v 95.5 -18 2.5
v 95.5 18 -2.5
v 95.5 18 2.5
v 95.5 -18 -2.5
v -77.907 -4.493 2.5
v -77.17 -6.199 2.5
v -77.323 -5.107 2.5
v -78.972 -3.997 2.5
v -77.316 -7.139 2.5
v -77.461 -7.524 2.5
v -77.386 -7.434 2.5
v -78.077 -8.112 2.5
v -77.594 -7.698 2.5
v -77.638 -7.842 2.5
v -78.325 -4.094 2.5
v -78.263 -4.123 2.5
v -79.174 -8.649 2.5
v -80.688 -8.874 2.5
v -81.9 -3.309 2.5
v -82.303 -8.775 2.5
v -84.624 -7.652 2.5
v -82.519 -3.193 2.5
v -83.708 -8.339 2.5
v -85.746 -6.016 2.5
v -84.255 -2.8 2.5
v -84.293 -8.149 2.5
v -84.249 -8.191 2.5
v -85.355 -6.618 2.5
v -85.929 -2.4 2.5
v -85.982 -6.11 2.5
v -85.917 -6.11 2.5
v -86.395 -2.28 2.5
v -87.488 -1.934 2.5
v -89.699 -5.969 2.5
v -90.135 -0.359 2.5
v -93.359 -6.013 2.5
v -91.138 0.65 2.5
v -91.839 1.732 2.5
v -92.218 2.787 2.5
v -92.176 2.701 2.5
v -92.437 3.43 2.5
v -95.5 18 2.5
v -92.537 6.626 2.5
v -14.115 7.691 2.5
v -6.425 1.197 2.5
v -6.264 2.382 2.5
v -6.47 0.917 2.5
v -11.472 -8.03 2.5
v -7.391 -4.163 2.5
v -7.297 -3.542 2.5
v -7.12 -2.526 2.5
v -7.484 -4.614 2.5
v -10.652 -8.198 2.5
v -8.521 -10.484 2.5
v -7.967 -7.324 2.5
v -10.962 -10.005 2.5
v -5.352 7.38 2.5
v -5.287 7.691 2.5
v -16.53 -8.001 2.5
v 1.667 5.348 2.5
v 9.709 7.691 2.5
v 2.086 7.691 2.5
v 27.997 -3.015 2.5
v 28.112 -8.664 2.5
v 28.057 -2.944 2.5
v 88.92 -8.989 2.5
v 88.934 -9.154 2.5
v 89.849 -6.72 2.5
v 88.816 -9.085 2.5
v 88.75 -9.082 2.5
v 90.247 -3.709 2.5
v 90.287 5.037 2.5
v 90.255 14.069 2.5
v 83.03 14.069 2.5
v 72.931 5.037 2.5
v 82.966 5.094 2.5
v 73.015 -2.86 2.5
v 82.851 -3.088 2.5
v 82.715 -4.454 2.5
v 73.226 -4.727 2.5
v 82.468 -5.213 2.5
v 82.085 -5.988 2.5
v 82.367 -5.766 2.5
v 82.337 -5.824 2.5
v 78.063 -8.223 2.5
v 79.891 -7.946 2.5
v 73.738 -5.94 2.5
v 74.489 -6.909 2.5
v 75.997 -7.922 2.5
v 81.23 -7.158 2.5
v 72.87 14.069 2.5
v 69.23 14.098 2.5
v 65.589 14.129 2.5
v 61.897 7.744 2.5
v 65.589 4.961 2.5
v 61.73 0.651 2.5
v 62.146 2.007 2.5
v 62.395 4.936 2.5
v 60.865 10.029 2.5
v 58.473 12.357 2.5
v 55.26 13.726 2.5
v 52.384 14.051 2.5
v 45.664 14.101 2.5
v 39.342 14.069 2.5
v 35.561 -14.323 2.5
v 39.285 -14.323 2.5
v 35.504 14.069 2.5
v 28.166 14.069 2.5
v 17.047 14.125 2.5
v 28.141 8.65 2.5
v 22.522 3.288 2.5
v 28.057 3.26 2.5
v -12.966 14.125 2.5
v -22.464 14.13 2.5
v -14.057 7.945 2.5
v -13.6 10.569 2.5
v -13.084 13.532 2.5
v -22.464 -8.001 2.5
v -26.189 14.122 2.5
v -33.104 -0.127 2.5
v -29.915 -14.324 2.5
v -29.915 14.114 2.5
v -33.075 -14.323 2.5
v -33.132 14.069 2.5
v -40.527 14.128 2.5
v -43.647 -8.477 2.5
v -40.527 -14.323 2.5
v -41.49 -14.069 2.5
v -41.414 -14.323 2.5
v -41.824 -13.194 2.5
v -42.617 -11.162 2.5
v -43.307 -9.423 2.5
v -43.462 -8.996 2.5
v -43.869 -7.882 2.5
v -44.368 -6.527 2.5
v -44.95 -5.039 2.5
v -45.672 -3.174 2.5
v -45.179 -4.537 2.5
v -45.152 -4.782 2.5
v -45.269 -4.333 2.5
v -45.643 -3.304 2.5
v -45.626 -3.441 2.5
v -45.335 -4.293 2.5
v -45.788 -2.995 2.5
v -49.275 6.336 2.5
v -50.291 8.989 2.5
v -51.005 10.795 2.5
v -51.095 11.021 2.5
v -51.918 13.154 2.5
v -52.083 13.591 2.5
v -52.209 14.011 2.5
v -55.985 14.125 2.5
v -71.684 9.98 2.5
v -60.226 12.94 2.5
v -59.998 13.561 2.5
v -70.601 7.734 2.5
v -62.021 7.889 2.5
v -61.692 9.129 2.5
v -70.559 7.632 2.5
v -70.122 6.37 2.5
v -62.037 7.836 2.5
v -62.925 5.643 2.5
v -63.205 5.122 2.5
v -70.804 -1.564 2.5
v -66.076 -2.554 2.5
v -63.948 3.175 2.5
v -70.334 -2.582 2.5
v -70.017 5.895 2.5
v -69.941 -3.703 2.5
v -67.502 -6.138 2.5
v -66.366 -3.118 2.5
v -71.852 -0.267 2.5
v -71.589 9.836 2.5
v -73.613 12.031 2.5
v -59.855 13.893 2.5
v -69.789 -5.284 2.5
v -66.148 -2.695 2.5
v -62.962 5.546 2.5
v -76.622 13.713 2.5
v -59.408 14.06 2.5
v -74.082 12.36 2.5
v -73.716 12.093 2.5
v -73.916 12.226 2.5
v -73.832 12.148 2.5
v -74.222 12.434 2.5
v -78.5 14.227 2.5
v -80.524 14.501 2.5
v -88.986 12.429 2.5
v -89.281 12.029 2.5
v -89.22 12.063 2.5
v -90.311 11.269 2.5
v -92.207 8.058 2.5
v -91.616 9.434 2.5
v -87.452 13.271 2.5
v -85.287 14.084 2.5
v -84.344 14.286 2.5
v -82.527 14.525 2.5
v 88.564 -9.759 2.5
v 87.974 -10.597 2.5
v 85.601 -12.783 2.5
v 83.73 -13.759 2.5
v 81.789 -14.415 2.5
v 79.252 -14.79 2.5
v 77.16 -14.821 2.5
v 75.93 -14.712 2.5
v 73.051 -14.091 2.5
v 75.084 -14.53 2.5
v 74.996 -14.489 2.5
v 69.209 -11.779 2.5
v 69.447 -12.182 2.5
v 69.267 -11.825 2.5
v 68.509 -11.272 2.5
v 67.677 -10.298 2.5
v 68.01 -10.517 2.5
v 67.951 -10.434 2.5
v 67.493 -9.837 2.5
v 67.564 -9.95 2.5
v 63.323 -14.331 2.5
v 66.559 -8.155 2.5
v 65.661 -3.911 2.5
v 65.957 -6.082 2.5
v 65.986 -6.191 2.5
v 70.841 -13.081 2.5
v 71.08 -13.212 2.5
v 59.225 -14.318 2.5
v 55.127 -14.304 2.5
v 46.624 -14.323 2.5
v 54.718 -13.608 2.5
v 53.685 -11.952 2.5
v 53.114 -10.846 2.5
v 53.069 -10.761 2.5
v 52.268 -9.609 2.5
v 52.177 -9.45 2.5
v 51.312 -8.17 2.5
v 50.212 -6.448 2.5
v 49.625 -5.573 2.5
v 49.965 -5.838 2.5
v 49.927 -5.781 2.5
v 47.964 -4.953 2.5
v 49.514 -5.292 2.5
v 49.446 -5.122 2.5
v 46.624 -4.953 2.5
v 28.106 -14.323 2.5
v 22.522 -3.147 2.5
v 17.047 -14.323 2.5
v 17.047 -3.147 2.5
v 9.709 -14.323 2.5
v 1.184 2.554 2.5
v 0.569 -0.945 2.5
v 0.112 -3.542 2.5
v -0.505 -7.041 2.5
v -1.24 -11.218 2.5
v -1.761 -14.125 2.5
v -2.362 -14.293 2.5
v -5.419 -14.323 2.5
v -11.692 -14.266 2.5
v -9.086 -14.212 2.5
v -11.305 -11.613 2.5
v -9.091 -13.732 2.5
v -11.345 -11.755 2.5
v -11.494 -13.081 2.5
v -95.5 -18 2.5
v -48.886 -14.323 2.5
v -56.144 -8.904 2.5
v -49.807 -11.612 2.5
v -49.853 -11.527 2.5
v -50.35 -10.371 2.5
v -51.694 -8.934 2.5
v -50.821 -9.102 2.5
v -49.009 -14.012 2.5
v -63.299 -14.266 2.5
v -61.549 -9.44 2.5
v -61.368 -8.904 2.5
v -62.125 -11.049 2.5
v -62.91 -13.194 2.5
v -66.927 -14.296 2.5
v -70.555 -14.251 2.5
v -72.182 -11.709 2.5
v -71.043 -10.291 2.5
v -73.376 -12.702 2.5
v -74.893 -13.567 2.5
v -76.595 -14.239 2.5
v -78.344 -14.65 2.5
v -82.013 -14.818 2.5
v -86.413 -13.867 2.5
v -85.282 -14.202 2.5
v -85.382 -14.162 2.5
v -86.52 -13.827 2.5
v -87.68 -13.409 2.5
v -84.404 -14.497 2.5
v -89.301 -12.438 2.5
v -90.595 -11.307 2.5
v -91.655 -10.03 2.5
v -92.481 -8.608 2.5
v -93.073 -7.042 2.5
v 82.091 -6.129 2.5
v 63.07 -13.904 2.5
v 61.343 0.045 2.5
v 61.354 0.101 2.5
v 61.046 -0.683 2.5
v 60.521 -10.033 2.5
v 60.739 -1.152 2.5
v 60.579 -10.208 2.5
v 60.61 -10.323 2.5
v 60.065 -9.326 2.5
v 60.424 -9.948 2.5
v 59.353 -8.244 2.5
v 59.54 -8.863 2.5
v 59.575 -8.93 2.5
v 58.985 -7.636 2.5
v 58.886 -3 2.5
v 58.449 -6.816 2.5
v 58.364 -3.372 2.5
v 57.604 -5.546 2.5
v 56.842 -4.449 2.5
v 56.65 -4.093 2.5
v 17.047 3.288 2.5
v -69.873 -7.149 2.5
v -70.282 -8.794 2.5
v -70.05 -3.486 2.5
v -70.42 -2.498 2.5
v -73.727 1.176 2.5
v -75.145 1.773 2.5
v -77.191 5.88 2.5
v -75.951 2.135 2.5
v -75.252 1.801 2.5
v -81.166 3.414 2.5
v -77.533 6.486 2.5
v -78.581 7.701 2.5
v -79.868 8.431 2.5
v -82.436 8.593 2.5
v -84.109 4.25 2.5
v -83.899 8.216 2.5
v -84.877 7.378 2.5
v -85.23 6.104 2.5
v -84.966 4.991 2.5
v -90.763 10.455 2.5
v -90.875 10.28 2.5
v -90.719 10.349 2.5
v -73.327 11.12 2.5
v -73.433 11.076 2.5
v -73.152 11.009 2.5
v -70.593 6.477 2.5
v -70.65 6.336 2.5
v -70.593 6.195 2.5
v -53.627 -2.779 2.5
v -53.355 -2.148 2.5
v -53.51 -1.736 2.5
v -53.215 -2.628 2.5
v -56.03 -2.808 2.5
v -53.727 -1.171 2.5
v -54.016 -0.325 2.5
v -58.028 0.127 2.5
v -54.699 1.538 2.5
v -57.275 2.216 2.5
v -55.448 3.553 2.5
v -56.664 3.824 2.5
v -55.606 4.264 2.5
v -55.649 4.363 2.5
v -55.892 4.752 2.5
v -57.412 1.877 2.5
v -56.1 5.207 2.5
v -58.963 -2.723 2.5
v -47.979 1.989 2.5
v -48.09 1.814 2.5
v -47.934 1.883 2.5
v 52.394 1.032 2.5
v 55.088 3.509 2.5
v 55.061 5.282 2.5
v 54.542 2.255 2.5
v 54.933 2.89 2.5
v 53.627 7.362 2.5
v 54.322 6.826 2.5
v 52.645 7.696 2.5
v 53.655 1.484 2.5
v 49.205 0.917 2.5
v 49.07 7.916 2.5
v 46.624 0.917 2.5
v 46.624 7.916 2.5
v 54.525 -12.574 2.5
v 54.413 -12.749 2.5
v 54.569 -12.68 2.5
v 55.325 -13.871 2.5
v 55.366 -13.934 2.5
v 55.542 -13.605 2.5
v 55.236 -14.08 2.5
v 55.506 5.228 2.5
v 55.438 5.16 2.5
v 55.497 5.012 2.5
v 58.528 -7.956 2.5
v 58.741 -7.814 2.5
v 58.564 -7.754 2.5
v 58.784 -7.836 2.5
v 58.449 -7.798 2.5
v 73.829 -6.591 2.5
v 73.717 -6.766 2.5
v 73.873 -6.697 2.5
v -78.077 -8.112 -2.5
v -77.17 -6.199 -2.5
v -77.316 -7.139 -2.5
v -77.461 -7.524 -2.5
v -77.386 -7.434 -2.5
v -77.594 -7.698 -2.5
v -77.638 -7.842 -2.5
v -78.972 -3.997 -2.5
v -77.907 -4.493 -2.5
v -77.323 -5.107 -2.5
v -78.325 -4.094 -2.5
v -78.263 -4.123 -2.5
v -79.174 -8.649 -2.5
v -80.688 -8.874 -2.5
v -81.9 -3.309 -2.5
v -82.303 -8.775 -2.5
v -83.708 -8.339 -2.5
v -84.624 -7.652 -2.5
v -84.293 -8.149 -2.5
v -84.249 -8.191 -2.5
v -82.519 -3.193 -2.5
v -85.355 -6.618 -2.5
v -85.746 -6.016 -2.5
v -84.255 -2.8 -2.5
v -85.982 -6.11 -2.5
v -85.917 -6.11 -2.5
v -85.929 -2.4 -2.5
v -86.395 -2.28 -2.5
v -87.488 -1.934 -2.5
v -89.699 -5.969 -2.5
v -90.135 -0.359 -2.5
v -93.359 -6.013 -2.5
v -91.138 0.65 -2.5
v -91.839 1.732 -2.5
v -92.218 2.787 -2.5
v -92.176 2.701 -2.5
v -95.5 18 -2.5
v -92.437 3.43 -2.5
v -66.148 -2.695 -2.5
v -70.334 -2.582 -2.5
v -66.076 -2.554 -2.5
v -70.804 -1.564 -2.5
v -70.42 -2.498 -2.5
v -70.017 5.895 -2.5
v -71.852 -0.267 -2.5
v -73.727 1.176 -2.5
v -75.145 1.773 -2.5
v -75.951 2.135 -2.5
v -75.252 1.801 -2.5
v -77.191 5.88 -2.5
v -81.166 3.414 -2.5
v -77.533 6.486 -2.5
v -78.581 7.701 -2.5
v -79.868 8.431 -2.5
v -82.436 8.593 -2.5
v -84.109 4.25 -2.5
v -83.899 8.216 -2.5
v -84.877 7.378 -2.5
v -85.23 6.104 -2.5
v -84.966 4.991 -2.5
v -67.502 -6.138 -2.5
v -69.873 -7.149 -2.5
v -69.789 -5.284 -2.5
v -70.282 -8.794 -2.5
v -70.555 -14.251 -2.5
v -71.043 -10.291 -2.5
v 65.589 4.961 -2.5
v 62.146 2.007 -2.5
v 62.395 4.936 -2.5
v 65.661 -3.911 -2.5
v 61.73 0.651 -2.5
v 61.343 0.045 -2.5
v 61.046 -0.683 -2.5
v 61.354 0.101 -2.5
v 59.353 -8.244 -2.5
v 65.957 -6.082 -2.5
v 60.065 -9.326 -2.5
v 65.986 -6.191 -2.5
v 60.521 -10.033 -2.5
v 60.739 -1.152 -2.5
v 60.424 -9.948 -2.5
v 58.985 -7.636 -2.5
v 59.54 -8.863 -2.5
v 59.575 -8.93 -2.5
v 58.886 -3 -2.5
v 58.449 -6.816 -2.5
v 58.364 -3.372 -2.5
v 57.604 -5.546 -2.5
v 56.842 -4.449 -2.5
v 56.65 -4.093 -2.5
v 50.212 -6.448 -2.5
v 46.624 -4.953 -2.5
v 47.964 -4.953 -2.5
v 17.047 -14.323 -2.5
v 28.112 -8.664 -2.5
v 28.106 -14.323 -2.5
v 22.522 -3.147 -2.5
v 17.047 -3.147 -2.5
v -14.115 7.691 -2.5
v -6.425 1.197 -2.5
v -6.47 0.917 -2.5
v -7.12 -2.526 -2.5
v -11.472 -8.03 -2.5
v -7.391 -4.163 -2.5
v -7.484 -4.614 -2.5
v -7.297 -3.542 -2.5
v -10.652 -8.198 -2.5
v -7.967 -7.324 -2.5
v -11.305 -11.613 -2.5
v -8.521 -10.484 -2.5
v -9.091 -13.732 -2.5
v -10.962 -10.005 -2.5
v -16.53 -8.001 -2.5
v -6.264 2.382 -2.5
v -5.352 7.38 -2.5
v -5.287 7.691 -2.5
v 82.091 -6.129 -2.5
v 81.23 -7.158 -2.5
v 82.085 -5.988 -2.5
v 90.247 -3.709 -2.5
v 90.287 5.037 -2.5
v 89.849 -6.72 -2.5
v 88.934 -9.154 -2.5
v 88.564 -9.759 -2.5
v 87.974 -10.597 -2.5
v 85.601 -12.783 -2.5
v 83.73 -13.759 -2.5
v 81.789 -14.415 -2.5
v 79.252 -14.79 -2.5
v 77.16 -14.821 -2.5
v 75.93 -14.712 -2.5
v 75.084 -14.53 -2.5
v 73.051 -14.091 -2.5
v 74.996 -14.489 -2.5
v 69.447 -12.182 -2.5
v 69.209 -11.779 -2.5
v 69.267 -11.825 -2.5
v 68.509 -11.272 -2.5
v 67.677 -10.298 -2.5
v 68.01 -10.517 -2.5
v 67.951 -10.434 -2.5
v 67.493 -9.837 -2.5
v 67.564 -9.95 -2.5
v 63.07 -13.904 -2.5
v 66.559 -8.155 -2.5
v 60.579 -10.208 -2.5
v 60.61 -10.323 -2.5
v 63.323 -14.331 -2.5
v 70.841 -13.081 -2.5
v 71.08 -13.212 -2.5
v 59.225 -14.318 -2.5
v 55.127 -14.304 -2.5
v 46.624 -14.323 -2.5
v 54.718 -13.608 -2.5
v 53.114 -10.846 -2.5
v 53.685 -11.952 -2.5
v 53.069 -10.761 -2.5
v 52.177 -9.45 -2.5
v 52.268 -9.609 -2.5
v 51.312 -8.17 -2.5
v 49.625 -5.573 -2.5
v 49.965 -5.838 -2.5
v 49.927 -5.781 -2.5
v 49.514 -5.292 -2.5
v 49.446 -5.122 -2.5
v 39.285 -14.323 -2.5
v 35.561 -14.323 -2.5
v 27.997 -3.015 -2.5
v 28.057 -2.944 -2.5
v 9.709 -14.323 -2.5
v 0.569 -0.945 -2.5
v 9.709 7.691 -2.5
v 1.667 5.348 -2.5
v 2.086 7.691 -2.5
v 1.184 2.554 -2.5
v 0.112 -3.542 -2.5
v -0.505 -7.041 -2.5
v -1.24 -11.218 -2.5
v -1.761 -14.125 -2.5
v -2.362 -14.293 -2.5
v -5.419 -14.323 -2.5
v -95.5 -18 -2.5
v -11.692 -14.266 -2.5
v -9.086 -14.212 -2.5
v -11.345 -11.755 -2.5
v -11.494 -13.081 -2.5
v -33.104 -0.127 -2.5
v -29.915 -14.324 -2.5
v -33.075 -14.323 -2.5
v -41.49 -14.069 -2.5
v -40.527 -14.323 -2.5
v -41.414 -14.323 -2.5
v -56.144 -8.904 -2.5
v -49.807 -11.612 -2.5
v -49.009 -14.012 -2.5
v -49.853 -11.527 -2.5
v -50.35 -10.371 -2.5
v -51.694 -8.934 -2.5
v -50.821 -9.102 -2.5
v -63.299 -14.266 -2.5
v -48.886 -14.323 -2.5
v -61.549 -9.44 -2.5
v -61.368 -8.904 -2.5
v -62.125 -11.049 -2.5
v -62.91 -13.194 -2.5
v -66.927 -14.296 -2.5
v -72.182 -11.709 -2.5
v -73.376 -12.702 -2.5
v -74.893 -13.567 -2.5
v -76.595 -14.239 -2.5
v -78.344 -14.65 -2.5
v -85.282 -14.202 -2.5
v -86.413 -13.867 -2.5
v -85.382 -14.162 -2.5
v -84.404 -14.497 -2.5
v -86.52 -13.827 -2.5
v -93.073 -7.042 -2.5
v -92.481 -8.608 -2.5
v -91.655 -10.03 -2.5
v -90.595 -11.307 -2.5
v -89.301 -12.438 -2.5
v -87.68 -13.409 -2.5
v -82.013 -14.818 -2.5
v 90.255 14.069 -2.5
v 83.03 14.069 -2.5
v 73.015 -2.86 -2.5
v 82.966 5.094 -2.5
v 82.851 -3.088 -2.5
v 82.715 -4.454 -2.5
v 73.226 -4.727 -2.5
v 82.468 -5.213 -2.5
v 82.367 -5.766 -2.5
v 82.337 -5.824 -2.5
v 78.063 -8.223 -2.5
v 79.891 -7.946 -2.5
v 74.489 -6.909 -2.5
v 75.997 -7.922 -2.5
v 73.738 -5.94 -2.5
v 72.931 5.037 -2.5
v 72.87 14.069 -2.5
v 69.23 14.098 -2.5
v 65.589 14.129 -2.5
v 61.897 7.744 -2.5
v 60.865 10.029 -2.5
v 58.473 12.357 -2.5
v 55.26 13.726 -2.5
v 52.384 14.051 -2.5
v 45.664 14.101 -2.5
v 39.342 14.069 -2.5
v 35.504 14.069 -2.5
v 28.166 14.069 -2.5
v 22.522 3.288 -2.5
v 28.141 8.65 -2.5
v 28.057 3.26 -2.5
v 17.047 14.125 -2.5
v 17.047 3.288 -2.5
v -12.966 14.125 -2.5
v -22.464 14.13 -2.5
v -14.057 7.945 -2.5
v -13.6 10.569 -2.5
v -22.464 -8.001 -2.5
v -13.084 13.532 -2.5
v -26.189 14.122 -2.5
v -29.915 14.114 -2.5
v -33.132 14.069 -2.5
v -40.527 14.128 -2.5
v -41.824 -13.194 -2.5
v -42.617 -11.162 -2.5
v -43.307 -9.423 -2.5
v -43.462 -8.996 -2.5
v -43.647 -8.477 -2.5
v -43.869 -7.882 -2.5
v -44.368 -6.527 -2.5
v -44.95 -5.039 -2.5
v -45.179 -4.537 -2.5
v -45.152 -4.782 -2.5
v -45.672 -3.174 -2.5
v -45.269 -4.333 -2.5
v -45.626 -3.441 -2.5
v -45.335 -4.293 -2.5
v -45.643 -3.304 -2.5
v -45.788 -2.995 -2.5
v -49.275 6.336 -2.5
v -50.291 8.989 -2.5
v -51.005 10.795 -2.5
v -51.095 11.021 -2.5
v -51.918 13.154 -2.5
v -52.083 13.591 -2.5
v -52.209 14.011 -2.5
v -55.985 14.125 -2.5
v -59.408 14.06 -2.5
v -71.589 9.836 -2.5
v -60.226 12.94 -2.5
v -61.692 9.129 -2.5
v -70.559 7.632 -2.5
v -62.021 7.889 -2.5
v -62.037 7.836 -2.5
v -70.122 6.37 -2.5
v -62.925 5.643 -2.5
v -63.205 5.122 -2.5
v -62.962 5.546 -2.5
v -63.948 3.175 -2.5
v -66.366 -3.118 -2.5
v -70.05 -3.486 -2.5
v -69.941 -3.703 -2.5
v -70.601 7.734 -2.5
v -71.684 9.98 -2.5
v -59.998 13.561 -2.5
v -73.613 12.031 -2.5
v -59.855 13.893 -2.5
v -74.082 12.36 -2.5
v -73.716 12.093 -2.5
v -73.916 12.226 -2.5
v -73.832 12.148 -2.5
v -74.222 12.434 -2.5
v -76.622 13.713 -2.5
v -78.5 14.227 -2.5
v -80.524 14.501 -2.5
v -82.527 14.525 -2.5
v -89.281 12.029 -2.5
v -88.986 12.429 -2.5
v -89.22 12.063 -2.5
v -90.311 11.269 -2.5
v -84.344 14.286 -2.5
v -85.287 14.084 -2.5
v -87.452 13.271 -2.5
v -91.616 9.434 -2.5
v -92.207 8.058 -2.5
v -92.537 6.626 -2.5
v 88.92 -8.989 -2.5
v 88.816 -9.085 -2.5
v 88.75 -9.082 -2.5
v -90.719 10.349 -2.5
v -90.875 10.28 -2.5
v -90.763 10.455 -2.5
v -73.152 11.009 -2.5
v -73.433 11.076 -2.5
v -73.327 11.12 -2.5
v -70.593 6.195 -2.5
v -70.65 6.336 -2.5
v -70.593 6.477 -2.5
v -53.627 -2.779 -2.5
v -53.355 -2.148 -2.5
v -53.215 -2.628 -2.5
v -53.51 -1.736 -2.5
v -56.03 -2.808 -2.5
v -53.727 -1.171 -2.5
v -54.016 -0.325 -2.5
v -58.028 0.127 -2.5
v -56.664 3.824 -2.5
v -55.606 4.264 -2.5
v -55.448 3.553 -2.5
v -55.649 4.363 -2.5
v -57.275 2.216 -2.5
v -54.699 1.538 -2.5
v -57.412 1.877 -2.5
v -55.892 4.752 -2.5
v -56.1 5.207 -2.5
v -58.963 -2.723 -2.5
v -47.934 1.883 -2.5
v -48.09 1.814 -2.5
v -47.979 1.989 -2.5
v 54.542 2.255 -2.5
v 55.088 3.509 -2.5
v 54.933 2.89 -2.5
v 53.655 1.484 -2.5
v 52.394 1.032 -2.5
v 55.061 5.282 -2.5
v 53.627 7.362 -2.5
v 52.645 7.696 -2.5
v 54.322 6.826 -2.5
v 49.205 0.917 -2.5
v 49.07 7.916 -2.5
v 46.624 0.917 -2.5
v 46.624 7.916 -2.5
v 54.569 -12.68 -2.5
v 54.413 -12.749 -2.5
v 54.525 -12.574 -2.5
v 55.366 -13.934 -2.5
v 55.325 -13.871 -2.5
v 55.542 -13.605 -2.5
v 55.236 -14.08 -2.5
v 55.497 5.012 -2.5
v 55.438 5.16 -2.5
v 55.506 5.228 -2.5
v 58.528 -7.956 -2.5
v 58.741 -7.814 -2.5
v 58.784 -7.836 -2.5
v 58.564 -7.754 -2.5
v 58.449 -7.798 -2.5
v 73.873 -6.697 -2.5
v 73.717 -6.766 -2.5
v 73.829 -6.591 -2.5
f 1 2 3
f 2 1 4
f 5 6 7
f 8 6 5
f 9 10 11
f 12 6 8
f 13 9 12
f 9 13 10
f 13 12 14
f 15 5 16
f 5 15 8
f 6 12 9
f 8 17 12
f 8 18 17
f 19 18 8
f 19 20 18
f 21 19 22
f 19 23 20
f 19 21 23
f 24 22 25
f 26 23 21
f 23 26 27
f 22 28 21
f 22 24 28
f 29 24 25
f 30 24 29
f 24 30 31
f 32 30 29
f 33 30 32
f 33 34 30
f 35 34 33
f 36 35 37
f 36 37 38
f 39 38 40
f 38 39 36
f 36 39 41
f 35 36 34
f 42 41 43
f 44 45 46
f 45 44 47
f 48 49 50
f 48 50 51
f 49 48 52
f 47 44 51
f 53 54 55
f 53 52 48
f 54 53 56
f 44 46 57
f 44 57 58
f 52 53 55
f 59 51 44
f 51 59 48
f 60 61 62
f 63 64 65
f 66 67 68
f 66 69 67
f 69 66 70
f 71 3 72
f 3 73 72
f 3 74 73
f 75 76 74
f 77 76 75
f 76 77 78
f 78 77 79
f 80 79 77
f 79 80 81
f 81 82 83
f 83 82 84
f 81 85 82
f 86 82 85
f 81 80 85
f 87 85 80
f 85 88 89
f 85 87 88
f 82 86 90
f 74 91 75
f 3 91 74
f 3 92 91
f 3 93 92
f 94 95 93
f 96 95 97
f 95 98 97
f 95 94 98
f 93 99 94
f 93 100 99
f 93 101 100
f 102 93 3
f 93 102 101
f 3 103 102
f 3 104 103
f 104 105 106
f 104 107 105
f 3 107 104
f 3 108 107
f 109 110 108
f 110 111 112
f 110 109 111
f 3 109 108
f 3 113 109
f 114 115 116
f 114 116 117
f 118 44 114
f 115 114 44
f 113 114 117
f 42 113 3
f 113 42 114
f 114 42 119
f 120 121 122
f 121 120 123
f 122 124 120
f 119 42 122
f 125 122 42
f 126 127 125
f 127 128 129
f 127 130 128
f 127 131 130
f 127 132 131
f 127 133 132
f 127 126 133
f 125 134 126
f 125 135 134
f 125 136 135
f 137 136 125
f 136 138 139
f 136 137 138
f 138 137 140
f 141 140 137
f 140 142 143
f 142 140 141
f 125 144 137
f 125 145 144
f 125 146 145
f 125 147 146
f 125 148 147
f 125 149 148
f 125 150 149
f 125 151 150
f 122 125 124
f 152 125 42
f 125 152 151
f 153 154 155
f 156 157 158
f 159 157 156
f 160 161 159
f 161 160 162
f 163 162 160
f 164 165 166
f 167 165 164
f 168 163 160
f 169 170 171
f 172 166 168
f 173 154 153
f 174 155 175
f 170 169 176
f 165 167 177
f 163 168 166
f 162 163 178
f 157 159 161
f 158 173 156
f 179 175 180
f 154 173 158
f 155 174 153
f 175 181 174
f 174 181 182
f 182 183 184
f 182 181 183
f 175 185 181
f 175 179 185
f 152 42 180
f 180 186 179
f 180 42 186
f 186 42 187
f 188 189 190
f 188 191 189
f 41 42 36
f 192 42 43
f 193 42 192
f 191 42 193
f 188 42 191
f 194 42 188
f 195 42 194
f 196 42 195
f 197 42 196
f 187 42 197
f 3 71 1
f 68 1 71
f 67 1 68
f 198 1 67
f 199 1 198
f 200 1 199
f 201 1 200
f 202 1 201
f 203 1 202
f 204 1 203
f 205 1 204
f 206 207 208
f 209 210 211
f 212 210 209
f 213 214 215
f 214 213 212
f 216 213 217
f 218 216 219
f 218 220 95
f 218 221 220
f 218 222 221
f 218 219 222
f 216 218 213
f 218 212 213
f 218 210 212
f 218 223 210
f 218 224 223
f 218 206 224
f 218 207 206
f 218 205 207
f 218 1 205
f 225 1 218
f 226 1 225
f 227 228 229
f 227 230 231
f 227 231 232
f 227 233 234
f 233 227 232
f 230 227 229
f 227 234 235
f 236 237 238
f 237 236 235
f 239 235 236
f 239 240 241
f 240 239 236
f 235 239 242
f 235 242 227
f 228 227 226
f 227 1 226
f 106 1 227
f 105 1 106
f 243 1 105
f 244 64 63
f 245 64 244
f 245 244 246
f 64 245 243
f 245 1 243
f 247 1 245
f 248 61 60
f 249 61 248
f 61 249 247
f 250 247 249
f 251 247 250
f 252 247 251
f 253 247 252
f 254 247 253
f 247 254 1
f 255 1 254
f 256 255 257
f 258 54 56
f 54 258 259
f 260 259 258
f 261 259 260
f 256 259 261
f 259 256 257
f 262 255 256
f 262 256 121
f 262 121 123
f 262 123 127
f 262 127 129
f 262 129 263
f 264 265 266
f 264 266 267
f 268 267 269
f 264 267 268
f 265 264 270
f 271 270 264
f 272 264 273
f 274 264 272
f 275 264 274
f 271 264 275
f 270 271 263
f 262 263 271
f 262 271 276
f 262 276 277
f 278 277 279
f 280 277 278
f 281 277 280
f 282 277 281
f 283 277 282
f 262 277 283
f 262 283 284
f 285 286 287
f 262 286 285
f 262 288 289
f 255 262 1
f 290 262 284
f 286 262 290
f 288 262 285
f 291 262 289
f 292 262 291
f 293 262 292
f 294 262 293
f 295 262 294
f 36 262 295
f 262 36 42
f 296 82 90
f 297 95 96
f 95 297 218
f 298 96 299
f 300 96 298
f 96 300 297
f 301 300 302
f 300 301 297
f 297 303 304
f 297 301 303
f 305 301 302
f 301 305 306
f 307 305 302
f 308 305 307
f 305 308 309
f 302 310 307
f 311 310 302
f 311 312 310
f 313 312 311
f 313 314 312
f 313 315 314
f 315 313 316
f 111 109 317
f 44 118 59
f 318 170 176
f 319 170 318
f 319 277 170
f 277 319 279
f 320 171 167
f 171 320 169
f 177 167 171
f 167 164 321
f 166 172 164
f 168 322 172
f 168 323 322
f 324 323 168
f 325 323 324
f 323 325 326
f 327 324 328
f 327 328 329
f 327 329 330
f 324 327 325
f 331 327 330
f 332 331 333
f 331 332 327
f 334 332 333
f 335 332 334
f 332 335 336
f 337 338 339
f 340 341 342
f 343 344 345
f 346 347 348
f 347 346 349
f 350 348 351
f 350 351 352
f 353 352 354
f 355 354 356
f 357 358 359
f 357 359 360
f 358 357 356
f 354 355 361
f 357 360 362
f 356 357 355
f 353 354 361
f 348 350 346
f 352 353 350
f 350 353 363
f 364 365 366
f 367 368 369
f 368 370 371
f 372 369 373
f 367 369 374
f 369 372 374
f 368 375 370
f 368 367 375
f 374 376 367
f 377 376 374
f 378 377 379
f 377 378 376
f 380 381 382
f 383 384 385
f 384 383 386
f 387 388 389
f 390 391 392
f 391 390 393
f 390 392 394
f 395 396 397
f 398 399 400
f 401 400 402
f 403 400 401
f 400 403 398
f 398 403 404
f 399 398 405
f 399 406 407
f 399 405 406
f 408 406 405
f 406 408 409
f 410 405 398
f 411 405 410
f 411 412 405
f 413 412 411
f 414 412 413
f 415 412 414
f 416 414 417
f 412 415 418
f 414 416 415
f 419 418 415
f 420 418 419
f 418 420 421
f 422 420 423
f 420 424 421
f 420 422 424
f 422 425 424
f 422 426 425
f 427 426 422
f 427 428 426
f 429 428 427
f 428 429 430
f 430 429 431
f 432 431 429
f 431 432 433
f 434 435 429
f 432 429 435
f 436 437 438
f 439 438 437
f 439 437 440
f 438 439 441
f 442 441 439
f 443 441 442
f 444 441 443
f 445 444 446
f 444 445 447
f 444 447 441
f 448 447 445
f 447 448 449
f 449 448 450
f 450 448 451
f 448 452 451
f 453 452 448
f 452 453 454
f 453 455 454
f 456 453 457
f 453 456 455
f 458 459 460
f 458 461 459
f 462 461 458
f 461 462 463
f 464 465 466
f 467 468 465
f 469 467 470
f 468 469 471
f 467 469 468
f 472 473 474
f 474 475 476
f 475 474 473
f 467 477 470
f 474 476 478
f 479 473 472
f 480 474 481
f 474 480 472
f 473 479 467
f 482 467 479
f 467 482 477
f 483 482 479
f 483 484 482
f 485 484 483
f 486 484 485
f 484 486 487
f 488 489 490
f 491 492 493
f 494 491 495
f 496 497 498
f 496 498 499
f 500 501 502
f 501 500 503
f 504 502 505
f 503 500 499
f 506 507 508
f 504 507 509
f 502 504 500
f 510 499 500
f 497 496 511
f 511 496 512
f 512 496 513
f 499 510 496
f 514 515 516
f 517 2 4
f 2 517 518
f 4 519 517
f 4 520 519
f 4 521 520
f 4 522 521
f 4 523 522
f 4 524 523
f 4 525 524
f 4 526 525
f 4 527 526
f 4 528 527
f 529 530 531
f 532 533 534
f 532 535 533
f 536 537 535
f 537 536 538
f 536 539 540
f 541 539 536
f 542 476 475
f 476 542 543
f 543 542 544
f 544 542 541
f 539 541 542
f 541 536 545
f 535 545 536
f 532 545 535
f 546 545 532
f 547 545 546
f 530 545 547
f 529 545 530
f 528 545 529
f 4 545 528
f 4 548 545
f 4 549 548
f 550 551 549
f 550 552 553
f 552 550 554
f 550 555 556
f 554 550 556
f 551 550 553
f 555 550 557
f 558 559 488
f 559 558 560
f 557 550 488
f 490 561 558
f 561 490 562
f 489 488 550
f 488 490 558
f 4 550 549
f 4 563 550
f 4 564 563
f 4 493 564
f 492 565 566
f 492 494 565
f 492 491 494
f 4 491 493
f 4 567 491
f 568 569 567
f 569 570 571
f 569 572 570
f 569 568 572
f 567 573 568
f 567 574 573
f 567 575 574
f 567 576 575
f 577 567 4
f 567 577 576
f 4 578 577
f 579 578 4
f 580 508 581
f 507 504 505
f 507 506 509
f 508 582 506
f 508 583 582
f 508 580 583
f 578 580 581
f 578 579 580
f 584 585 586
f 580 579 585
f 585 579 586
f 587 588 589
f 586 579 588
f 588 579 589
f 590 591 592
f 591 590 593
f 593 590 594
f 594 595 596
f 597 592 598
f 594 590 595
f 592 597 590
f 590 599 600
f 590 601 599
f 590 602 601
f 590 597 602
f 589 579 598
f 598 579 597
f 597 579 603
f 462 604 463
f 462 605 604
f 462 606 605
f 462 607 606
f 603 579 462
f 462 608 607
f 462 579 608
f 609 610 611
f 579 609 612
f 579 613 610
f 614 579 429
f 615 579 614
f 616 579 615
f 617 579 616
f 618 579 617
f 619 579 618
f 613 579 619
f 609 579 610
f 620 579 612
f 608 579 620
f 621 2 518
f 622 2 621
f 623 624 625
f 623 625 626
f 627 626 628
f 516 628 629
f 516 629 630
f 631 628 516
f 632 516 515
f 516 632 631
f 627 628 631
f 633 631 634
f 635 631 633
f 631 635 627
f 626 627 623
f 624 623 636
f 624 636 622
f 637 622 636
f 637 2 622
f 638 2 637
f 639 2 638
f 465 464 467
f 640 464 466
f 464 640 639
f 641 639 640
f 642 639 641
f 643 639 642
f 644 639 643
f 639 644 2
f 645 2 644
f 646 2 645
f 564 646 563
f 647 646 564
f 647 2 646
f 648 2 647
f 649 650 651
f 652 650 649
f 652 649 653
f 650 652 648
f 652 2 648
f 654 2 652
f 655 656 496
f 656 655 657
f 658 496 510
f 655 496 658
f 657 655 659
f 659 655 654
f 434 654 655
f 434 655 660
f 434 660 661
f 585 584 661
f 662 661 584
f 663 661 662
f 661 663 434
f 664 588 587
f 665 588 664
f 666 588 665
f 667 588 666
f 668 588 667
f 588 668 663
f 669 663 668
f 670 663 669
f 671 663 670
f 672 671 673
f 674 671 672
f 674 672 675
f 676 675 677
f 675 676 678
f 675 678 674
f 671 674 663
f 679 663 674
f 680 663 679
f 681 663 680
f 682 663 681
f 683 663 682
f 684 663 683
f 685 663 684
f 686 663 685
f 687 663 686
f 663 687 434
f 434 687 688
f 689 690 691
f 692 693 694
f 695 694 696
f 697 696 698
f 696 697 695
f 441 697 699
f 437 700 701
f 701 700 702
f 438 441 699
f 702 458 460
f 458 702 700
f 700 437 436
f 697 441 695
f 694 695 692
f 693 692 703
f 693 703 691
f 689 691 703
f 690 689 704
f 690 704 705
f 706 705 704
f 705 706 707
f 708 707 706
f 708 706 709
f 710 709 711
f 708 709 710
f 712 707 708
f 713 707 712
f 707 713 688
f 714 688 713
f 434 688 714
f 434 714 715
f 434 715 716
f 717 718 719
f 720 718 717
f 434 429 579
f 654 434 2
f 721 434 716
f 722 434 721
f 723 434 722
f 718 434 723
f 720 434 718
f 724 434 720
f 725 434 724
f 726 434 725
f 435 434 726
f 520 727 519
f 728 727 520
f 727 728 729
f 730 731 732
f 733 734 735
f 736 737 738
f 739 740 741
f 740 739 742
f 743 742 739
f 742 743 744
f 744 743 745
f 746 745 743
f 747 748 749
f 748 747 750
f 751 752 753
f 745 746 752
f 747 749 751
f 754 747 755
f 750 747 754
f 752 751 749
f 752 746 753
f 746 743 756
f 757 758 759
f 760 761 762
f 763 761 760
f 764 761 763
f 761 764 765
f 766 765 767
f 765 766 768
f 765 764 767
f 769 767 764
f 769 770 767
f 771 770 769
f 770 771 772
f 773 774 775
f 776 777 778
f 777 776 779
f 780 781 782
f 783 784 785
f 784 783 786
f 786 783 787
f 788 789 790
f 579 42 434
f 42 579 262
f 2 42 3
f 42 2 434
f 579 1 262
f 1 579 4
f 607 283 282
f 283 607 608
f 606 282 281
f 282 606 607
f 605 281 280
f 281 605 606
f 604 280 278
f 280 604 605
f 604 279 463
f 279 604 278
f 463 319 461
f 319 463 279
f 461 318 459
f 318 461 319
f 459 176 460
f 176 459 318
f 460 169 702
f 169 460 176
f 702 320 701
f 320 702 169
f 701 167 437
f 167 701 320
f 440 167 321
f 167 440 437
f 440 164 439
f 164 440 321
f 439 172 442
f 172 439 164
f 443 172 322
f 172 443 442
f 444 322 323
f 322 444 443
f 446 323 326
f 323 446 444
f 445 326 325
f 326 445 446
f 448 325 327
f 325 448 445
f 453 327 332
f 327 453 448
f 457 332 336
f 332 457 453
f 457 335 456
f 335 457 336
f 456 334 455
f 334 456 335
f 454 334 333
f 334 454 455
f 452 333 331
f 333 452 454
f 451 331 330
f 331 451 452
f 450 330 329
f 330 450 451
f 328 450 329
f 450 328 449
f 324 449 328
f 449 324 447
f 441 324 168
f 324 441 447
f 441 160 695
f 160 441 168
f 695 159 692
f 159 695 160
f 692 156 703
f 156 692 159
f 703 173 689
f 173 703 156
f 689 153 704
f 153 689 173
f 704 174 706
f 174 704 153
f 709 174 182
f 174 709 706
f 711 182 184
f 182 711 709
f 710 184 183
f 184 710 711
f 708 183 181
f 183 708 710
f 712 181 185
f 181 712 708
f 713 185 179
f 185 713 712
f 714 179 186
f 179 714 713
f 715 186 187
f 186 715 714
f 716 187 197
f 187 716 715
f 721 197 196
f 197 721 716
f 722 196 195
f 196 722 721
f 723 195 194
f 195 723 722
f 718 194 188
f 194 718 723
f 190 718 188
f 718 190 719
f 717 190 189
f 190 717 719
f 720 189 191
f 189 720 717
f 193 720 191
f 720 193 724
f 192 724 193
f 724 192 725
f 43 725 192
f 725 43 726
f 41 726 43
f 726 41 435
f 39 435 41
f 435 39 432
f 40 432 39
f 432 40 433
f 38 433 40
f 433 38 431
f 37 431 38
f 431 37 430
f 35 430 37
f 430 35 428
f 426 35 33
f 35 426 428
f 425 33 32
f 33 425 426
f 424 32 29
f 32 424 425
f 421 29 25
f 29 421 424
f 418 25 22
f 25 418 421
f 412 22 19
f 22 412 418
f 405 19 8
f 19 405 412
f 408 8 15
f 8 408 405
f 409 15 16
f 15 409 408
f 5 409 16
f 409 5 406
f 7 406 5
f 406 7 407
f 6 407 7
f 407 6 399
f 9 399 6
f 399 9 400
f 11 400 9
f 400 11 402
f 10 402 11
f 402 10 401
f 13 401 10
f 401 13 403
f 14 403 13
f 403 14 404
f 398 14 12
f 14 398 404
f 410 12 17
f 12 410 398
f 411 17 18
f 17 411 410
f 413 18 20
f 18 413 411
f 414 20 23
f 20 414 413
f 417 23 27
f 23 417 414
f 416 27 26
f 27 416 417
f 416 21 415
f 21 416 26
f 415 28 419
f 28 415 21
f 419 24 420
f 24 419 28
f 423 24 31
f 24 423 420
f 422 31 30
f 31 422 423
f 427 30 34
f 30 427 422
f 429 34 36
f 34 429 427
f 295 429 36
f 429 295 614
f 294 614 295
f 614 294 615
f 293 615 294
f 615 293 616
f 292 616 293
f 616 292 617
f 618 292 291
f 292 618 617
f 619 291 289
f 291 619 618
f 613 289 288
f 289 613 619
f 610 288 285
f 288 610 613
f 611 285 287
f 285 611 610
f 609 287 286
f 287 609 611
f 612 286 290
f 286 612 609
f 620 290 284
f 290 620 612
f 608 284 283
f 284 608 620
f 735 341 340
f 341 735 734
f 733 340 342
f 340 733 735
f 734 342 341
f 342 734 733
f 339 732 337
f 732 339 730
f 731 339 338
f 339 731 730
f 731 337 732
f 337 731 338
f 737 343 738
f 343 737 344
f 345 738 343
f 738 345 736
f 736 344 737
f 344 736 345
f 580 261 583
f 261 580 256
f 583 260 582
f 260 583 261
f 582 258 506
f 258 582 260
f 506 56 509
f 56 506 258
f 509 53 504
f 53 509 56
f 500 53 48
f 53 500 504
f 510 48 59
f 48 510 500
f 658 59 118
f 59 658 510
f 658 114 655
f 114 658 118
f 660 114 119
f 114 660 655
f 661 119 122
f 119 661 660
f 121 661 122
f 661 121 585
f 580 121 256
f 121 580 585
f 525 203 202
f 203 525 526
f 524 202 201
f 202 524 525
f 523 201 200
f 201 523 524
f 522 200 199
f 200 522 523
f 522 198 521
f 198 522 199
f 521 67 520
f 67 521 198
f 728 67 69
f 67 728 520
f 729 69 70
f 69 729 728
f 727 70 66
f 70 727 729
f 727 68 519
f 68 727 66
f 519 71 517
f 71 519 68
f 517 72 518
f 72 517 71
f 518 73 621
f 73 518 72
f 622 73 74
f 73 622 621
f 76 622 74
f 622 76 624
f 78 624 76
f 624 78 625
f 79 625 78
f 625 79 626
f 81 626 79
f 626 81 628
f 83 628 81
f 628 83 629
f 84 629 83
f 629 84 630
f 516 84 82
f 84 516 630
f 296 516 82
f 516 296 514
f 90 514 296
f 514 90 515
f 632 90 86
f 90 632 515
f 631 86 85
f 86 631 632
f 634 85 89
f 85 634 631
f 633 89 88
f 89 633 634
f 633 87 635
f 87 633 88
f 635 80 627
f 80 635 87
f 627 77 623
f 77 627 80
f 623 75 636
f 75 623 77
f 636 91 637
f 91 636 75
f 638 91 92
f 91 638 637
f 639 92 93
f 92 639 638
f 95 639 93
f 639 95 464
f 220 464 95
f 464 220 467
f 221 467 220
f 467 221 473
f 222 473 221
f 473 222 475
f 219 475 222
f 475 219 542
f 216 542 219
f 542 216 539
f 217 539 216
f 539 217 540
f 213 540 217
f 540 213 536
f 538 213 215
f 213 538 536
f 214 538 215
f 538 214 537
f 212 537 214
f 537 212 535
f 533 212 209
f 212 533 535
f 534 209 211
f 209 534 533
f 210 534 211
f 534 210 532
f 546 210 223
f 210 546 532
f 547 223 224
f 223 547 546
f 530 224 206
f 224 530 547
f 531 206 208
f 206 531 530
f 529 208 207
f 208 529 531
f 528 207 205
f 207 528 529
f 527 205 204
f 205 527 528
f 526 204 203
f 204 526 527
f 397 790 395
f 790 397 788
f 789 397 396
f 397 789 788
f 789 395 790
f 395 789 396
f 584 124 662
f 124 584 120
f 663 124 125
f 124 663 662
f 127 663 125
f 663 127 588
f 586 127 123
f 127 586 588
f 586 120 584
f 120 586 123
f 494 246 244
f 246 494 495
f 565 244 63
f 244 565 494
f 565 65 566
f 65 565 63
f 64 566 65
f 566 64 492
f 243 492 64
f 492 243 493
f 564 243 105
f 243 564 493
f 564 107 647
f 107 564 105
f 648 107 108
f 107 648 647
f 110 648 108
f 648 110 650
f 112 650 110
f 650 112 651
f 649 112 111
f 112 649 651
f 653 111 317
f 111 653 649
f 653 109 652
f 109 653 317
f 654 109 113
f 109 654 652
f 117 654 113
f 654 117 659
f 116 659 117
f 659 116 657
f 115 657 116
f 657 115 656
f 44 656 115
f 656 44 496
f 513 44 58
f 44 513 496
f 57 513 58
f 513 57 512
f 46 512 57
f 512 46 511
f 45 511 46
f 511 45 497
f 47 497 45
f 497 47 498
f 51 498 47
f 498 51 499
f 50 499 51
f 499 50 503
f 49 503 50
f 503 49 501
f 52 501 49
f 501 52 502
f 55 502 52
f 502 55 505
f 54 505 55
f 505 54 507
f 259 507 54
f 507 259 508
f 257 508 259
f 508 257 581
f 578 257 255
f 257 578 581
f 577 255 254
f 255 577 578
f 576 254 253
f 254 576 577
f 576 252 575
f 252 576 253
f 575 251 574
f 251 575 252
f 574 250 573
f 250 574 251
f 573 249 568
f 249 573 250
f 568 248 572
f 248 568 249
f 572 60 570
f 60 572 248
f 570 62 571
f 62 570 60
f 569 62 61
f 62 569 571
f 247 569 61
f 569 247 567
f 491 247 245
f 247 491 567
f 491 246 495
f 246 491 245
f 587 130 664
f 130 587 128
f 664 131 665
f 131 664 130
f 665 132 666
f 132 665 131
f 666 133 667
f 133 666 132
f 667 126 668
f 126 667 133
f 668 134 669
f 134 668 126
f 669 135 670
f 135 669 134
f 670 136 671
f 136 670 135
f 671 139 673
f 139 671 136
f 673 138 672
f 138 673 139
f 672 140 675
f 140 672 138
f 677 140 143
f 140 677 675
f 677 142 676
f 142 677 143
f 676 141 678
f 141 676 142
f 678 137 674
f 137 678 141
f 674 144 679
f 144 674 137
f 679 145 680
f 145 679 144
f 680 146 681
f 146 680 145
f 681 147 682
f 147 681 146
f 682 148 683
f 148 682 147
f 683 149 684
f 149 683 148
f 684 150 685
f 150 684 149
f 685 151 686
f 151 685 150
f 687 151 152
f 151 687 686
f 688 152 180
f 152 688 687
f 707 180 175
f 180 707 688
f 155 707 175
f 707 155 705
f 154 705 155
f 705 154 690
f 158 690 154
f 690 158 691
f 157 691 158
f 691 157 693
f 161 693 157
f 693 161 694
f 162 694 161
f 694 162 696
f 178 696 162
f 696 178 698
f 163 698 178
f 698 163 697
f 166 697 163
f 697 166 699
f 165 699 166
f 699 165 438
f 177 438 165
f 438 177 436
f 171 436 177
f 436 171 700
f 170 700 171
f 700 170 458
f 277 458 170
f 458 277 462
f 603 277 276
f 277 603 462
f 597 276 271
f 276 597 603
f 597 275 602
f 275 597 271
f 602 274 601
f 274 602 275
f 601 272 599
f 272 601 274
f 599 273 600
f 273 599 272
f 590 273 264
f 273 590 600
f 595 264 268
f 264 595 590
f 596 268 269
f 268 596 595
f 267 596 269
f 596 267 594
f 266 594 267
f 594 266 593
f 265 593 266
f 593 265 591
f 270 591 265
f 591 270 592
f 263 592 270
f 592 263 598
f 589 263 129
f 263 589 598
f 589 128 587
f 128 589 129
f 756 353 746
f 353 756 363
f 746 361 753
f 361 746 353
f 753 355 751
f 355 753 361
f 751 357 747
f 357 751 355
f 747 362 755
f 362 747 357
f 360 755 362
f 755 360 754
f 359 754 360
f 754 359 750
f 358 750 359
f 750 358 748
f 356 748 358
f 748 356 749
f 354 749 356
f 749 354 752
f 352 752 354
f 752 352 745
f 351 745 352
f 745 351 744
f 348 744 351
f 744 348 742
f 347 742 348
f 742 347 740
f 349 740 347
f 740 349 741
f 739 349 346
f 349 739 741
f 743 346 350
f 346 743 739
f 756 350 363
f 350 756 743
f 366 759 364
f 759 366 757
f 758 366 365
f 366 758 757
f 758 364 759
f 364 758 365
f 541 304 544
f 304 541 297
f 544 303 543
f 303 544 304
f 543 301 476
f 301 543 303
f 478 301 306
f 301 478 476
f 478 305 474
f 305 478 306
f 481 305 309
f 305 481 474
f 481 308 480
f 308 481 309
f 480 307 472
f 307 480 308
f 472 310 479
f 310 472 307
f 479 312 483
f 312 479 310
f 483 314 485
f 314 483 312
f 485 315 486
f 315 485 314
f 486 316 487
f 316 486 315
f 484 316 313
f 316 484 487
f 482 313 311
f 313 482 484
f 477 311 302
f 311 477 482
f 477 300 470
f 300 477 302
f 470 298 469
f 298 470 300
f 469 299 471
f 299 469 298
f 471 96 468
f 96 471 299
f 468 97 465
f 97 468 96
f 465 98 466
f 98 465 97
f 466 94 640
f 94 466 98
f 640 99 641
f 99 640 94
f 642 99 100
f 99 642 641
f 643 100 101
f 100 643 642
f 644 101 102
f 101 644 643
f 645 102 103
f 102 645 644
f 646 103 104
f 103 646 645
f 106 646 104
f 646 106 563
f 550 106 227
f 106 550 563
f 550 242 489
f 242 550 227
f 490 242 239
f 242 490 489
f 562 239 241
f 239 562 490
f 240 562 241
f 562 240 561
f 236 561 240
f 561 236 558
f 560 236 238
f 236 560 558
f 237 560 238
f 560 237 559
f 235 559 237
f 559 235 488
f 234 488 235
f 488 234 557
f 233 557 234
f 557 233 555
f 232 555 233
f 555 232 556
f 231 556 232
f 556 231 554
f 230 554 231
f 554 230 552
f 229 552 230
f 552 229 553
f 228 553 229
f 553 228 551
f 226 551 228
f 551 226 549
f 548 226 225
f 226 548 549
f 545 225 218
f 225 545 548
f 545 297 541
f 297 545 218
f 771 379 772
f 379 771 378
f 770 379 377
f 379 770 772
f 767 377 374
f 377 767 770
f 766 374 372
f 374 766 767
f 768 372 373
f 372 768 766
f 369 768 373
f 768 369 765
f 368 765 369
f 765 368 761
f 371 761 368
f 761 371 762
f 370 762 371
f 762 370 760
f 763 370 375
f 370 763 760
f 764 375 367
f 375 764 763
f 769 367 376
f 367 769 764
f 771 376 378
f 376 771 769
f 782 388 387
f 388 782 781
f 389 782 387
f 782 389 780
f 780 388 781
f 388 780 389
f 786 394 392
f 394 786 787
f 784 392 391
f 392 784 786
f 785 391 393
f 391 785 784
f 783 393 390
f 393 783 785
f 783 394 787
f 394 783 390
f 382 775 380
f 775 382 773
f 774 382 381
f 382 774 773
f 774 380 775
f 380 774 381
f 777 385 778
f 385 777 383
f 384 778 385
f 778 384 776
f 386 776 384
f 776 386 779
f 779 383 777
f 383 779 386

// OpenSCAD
module sailthru() {
  difference() {
    cube([191,36, 5], center=true);
    #scale([.4,.4,1])translate([-190,-185,0])linear_extrude(height=10, center=true)import("sailthru_logo.dxf");
  }
}
sailthru();
